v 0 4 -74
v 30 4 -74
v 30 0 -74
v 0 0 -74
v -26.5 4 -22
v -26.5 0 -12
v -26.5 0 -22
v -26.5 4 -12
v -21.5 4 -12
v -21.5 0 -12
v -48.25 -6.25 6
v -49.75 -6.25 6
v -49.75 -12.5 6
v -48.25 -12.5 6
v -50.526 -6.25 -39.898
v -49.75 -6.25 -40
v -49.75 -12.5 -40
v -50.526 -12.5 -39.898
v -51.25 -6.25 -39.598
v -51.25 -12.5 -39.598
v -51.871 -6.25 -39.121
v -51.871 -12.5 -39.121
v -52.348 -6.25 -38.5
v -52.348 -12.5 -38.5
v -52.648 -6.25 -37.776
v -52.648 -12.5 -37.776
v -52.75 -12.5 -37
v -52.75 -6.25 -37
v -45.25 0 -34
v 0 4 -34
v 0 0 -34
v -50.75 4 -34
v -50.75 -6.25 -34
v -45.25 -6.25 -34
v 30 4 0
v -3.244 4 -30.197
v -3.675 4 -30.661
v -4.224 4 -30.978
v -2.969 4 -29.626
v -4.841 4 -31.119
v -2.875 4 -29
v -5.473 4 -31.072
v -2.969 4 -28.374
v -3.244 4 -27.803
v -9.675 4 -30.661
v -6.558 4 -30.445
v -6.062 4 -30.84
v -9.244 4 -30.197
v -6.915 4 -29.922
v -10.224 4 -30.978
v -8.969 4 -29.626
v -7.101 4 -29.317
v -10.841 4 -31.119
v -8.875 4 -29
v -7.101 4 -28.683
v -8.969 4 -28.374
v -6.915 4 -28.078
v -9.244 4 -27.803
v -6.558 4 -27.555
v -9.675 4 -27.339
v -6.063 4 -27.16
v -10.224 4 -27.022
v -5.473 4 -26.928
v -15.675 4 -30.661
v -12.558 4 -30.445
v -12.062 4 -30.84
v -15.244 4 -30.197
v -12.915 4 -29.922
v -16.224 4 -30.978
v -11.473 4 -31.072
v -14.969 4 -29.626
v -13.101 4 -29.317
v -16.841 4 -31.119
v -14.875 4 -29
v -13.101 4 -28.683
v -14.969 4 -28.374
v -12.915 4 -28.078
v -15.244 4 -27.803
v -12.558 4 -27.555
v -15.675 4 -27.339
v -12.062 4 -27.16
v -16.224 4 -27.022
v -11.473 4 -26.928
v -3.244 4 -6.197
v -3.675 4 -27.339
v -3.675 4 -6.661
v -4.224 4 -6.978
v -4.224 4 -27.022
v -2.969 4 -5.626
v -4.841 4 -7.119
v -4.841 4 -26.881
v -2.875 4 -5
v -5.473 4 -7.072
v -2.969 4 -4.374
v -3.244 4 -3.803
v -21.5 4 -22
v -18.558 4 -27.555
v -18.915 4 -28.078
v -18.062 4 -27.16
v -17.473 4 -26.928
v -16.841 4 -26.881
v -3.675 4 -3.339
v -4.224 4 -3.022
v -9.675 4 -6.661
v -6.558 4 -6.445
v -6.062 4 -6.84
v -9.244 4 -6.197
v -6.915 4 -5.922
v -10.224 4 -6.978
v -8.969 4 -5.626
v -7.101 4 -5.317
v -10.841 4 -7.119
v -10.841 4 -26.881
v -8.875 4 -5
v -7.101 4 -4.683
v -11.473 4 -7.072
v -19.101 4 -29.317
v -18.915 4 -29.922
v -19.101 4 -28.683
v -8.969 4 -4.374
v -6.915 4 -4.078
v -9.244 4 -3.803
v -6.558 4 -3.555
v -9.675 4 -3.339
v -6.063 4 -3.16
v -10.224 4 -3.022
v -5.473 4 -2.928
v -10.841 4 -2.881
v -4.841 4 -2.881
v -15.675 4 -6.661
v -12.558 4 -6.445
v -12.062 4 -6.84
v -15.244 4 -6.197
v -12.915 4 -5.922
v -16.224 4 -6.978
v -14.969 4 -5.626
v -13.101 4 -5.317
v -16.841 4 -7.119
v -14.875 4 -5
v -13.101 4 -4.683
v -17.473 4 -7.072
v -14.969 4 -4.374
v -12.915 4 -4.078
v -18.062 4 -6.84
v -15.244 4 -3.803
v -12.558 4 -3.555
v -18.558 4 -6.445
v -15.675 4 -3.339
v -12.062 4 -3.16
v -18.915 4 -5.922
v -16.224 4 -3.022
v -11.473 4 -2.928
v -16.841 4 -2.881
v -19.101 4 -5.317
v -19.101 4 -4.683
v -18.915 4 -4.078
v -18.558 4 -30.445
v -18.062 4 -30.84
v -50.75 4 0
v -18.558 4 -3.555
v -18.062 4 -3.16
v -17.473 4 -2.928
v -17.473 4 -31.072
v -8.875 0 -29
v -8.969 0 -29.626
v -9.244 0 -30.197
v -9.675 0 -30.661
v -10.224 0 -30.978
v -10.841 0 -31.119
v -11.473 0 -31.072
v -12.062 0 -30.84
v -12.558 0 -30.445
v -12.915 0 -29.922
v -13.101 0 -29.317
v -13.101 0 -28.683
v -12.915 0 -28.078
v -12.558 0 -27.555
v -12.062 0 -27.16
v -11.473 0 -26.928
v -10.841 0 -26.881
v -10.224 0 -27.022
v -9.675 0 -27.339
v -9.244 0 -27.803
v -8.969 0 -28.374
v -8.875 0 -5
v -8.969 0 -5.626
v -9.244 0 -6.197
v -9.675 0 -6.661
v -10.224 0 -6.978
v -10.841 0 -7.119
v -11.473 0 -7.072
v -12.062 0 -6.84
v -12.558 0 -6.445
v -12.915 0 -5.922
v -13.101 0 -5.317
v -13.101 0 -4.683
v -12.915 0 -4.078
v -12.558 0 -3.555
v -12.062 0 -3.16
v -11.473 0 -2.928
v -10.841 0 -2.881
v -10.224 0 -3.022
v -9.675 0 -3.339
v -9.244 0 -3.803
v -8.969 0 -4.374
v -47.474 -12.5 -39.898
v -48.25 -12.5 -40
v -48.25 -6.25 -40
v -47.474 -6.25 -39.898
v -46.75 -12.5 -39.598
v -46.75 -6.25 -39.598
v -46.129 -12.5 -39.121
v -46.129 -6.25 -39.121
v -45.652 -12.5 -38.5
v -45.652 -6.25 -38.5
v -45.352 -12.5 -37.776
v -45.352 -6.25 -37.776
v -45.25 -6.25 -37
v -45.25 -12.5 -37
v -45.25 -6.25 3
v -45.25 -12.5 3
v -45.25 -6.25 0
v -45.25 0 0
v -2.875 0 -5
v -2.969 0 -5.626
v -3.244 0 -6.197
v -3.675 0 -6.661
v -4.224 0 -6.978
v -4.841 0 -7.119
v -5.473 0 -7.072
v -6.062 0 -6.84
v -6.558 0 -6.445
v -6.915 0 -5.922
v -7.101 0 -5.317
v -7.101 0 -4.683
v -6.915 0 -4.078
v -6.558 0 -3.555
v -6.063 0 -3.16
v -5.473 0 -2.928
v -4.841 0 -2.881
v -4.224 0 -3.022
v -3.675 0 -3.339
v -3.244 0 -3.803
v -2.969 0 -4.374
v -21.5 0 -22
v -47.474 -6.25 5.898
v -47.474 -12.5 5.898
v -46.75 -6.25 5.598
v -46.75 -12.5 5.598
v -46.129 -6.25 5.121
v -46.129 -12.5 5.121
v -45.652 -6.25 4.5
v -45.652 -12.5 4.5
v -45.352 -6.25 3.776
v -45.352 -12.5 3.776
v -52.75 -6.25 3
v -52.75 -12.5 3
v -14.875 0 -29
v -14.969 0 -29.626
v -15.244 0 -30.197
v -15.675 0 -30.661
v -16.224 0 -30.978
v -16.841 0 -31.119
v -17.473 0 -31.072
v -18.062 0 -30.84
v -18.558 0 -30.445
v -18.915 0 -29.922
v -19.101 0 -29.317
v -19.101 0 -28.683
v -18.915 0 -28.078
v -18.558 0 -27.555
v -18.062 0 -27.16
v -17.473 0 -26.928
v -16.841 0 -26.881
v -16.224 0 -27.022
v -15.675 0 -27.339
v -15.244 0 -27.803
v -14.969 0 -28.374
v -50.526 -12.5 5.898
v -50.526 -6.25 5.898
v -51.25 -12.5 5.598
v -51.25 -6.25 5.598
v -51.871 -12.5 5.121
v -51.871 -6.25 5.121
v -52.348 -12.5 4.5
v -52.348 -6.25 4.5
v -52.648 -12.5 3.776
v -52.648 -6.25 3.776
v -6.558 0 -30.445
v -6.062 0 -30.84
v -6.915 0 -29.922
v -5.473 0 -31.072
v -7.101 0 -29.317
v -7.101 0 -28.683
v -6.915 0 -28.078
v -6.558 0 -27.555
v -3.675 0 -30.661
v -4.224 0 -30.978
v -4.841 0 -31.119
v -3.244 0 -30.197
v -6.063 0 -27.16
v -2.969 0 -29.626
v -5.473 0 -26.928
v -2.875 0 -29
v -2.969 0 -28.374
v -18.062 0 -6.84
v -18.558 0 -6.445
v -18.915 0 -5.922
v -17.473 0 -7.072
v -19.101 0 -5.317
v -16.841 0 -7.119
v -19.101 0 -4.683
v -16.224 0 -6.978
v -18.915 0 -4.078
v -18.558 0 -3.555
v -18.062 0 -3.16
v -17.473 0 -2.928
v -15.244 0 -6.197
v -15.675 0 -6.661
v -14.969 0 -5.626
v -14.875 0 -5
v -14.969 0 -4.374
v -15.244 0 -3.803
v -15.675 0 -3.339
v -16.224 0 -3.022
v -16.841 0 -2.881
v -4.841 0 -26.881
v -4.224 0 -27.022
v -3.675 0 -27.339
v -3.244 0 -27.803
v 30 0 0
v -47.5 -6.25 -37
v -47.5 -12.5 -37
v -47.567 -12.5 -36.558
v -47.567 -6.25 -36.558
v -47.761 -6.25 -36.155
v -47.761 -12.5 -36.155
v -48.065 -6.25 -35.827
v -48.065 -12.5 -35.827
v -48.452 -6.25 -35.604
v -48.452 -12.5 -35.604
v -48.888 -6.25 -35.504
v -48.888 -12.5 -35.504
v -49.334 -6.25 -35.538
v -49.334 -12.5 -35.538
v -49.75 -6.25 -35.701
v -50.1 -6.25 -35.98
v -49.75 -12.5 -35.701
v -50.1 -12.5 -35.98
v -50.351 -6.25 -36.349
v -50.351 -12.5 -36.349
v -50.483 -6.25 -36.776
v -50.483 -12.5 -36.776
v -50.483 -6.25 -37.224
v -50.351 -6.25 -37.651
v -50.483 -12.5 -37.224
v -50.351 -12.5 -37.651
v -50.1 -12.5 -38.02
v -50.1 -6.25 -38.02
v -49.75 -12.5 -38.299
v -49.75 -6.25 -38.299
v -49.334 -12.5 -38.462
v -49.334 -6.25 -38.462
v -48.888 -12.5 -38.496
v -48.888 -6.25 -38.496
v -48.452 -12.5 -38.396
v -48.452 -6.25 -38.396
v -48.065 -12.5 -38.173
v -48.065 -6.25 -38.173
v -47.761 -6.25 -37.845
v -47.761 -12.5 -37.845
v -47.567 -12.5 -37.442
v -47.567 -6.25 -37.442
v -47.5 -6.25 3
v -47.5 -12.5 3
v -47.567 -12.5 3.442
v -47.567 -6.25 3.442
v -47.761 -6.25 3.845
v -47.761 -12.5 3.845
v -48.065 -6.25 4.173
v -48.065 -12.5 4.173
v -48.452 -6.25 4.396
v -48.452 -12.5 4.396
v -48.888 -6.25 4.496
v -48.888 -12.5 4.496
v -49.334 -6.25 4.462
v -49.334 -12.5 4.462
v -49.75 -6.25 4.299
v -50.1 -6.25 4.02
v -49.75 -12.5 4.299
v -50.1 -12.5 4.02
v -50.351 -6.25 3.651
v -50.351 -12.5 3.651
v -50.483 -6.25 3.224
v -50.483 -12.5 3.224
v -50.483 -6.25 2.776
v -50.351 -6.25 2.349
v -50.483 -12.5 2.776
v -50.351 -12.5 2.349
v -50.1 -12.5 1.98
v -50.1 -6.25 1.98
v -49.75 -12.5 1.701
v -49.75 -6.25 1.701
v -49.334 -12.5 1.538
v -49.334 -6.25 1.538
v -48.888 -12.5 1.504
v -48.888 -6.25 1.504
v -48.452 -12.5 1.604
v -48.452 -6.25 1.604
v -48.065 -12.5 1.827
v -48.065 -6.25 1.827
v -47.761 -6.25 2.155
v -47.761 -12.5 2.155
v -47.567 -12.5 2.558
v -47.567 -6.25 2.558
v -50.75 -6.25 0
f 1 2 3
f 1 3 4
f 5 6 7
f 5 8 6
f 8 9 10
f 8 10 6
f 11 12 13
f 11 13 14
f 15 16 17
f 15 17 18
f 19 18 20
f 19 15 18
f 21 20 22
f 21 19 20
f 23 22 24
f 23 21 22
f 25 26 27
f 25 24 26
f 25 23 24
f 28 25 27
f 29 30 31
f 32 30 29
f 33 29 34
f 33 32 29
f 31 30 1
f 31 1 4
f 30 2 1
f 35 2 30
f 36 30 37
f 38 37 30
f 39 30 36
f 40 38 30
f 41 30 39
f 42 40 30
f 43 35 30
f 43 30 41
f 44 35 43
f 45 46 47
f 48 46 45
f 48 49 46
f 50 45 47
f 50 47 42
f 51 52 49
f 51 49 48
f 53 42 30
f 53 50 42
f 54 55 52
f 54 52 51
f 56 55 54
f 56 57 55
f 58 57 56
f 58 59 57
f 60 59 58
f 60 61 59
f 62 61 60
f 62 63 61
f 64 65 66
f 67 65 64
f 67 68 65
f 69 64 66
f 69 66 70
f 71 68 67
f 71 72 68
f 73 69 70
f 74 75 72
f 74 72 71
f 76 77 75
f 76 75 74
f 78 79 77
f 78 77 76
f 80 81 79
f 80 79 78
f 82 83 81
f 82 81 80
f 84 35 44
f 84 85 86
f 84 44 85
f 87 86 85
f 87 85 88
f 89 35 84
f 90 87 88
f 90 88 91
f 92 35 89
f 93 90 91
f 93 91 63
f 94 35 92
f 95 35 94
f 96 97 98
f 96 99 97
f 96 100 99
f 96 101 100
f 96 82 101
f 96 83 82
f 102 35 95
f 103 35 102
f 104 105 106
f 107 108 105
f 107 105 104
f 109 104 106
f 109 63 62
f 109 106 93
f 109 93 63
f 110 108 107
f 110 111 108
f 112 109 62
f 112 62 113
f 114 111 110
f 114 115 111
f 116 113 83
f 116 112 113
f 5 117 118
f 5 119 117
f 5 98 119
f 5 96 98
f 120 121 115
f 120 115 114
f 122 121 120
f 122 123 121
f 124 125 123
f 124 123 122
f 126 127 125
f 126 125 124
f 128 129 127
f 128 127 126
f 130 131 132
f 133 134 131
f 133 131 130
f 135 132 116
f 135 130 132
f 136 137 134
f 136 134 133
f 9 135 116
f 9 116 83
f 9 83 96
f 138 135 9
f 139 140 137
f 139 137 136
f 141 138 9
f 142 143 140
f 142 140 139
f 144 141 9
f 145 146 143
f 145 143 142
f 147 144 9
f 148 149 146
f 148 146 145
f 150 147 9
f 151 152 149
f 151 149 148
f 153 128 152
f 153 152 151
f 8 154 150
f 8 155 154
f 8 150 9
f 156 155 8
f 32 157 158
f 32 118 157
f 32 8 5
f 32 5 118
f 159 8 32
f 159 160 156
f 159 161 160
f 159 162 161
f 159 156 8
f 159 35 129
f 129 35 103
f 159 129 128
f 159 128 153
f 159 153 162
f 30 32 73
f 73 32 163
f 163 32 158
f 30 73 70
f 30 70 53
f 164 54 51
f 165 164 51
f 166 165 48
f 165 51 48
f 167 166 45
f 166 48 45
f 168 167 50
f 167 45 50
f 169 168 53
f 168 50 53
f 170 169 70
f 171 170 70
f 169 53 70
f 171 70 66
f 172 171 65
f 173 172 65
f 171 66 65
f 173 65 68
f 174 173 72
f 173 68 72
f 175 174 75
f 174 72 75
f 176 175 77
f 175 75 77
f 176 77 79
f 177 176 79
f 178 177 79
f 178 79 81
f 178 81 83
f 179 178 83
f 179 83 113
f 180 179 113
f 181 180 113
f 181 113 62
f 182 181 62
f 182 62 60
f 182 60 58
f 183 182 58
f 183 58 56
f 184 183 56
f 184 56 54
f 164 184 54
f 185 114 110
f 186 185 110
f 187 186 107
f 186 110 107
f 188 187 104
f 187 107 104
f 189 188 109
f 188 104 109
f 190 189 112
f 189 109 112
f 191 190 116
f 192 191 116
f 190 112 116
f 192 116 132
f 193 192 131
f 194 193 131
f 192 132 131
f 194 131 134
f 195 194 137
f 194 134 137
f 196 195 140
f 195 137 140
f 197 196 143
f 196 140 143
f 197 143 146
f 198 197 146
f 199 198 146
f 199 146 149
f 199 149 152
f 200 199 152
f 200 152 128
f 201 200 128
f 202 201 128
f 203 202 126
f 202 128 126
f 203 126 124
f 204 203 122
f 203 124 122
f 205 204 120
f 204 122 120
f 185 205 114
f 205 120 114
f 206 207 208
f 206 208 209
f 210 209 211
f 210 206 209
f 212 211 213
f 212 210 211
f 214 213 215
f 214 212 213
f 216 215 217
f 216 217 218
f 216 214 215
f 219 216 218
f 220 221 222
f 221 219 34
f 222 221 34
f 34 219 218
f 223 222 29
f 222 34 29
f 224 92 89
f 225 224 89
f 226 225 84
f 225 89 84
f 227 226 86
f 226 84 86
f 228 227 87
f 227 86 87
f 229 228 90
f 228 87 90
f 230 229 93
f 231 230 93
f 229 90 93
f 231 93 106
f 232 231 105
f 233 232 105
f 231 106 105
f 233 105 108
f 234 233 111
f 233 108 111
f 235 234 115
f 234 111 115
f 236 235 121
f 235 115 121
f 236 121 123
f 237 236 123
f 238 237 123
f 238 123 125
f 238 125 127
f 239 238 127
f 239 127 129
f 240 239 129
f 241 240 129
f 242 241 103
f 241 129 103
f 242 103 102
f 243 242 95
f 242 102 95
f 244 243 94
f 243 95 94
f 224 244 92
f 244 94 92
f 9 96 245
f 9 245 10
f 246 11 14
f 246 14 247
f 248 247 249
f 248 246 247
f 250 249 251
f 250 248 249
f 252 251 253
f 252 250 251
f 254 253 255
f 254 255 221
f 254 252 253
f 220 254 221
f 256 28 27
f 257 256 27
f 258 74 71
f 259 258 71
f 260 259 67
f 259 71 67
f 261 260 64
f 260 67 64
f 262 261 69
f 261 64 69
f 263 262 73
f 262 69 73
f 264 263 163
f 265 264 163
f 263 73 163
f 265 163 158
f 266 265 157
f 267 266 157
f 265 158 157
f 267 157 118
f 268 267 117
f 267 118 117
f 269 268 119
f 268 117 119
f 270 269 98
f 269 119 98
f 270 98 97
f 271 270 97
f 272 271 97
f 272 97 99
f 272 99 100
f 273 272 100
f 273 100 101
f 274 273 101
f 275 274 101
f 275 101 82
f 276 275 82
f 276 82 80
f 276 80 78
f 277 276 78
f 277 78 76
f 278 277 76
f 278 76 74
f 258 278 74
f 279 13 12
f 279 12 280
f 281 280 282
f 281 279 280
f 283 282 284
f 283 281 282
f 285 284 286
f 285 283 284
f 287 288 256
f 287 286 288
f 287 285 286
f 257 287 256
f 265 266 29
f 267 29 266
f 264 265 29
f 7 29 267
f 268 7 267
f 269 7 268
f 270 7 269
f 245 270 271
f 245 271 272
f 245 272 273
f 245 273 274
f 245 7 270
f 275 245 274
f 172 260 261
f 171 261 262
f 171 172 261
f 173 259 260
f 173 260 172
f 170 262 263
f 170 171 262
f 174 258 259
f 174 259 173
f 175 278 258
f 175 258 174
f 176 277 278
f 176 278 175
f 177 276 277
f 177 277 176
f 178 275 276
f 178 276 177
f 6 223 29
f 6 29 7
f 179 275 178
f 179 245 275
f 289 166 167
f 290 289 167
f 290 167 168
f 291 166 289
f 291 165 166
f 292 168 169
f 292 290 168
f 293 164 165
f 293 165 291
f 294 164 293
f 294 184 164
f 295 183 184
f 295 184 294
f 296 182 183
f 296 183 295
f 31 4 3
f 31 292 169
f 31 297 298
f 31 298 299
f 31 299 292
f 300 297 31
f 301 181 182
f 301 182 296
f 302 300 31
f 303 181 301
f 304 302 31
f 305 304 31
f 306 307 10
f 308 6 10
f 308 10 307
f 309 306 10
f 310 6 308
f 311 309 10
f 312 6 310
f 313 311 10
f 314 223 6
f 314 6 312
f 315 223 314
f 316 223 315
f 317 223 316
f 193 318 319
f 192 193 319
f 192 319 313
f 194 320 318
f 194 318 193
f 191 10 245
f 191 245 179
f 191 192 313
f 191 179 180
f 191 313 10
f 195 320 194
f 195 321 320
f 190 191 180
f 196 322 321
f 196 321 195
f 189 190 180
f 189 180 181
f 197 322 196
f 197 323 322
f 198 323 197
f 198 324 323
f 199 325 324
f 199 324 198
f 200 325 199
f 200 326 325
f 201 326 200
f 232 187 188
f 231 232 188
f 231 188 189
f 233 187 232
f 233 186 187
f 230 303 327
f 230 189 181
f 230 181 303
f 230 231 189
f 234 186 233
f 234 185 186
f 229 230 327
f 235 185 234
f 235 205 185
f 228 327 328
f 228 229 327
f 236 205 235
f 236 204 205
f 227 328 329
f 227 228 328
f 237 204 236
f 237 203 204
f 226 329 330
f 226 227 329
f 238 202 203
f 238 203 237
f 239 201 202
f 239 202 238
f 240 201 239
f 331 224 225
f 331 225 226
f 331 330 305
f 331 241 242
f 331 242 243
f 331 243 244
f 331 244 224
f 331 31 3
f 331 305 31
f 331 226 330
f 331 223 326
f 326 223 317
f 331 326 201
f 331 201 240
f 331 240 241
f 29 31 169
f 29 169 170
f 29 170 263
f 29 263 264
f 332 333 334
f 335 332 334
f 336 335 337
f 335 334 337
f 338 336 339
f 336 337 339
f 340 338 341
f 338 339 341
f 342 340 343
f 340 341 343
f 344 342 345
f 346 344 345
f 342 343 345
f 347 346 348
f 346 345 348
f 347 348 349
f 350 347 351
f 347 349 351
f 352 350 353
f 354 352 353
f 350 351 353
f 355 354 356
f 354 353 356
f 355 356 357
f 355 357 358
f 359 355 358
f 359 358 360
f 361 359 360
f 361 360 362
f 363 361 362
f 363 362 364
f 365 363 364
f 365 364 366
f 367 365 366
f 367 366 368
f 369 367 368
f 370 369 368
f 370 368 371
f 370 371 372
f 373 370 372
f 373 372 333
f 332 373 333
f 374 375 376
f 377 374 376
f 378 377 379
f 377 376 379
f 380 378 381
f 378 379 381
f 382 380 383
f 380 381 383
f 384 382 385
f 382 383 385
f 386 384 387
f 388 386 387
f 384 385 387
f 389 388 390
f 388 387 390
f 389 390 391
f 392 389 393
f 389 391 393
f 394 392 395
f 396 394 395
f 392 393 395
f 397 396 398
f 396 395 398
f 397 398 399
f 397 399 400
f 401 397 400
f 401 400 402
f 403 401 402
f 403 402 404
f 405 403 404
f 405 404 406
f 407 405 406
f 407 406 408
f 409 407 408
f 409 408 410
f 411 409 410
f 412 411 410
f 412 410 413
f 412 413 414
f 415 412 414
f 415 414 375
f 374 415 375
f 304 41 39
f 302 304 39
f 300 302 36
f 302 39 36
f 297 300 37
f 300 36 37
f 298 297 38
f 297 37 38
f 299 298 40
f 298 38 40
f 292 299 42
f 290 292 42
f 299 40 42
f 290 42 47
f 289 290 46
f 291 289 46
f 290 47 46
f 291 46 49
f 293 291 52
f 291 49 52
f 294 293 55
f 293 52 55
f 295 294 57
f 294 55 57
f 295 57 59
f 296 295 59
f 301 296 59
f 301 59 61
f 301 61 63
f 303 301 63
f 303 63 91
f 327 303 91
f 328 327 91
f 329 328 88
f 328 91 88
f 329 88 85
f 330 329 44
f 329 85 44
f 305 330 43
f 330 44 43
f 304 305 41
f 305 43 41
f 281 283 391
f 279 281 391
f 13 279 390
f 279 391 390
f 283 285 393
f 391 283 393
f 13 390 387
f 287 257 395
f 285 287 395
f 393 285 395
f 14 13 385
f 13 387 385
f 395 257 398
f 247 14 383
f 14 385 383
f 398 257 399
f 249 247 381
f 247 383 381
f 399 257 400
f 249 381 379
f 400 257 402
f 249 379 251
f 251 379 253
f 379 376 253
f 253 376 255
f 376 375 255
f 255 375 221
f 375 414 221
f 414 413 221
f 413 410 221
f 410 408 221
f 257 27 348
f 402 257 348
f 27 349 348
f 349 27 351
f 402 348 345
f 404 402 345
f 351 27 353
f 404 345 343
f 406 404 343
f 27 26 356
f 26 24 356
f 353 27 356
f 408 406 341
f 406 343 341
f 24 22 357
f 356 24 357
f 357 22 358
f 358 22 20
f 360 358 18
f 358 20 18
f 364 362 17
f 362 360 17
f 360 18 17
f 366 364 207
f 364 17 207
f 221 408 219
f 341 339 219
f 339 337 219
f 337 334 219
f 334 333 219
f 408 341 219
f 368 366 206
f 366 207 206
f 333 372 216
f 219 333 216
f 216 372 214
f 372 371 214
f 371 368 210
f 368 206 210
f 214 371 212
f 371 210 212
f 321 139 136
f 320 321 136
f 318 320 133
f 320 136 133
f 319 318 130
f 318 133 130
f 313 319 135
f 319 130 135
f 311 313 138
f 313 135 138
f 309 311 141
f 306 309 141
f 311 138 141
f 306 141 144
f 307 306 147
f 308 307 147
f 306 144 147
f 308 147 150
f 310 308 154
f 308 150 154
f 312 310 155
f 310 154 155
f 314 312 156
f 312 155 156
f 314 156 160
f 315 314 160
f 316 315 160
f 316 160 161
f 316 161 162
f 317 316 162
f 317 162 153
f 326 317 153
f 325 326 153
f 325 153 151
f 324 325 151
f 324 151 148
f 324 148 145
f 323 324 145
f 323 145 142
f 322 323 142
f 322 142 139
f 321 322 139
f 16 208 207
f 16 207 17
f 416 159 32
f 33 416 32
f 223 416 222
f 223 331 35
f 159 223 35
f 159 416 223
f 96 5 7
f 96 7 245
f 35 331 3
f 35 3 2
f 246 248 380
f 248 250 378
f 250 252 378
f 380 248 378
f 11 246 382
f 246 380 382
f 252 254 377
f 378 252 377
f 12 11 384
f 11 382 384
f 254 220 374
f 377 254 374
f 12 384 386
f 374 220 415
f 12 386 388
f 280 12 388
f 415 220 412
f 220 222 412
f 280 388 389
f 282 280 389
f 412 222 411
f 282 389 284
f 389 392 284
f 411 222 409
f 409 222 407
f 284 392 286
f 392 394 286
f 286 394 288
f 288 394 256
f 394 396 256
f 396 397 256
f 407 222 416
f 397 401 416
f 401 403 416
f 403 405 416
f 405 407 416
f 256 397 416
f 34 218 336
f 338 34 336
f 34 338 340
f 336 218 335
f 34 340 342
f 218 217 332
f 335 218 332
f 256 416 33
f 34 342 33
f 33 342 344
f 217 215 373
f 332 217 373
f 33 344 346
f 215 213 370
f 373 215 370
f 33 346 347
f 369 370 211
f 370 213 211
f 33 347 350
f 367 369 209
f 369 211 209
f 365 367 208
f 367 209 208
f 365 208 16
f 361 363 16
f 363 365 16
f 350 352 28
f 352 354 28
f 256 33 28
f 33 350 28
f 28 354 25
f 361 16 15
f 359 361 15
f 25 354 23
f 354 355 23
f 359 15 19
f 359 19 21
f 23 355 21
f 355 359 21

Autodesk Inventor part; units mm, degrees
ref_plane "YZ Plane" through (0, 0, 0) normal (1, 0, 0) x (0, 1, 0)
ref_plane "XZ Plane" through (0, 0, 0) normal (0, 1, 0) x (-1, 0, 0)
ref_plane "XY Plane" through (0, 0, 0) normal (0, 0, 1) x (1, 0, 0)
sketch "Sketch1" plane through (0, 0, 0) normal (0, 1, 0) x (-1, 0, 0)
  line L0 (0, 0) -> (22, 0)
  line L1 (22, 0) -> (22, -34)
  line L2 (22, -34) -> (0, -34)
  line L3 (0, -34) -> (0, 0)
  dimension "d0" = 22
  dimension "d1" = 34
extrude "Extrusion1" add sketch "Sketch1" along normal blind 4
sketch "Sketch2" plane through (0, 4, 0) normal (0, 1, 0) x (1, 0, 0)
  line L0 (-22, 0) -> (0, 0) projected
  circle A0 centre (-5, 5) radius 2.125
  dimension "d7" = 4.25
extrude "Extrusion2" cut sketch "Sketch2" against normal through all
pattern_linear "Rectangular Pattern1" count 3 spacing 6 along (-1, 0, 0) count 2 spacing 24 along (0, 0, -1) of "Extrusion2"
sketch "Sketch3" plane through (-22, 0, -34) normal (-1, 0, 0) x (0, 0, 1)
  line L0 (34, 0) -> (0, 0)
  line L1 (0, 0) -> (0, 4)
  line L2 (0, 4) -> (34, 4)
  line L3 (34, 4) -> (34, 0)
extrude "Extrusion3" add sketch "Sketch3" along normal blind 23.25
sketch "Sketch4" plane through (0, 4, 0) normal (0, 1, 0) x (1, 0, 0)
  line L0 (-45.25, 0) -> (-50.75, 0)
  line L1 (-50.75, 0) -> (-50.75, 34)
  line L2 (-50.75, 34) -> (-45.25, 34)
  line L3 (-45.25, 34) -> (-45.25, 0)
  point P0 (0, 0)
  dimension "d18" = 5.5
extrude "Extrusion4" add sketch "Sketch4" against normal blind 16.5
sketch "Sketch5" plane through (-50.75, 4, -34) normal (-1, 0, 0) x (0, 0, 1)
  line L0 (0, -4) -> (0, -16.5) projected
  line L1 (34, -16.5) -> (0, -16.5)
  line L2 (0, -16.5) -> (0, -10.25)
  line L3 (0, -10.25) -> (34, -10.25)
  line L4 (34, -10.25) -> (34, -16.5)
  point P0 (34, -4)
  dimension "d21" = 6.25
extrude "Extrusion5" add sketch "Sketch5" along normal blind 2
sketch "Sketch6" plane through (0, 0, -34) normal (0, 0, -1) x (-1, 0, 0)
  line L0 (52.75, -6.25) -> (45.25, -6.25)
  line L1 (45.25, -6.25) -> (45.25, -12.5)
  line L2 (45.25, -12.5) -> (52.75, -12.5)
  line L3 (52.75, -12.5) -> (52.75, -6.25)
  point P0 (0, 0)
extrude "Extrusion6" add sketch "Sketch6" along normal blind 6
sketch "Sketch7" plane through (0, 0, 0) normal (0, 0, 1) x (1, 0, 0)
  line L0 (-52.75, -12.5) -> (-45.25, -12.5)
  line L1 (-45.25, -12.5) -> (-45.25, -6.25)
  line L2 (-45.25, -6.25) -> (-52.75, -6.25)
  line L3 (-52.75, -6.25) -> (-52.75, -12.5)
  point P0 (0, 0)
extrude "Extrusion7" add sketch "Sketch7" along normal blind 6
fillet "Fillet1" radius 3 1 edges at (-52.75, -9.375, 6)
fillet "Fillet2" radius 3 1 edges at (-45.25, -9.375, 6)
fillet "Fillet3" radius 3 1 edges at (-52.75, -9.375, -40)
fillet "Fillet4" radius 3 1 edges at (-45.25, -9.375, -40)
sketch "Sketch8" plane through (0, -12.5, 0) normal (0, -1, 0) x (1, 0, 0)
  line L0 (-45.25, -34) -> (-52.75, -34)
  line L1 (-52.75, 3) -> (-52.75, -37) projected
  line L2 (-45.25, -34) -> (0, -34) projected
  line L3 (-49.75, -40) -> (-48.25, -40) projected
  line L4 (-49, -40) -> (-49, -34)
  line L5 (-45.25, -34) -> (-50.75, -34) projected
  line L6 (-52.75, 0) -> (-45.25, 0)
  line L7 (-50.75, 0) -> (-45.25, 0) projected
  line L8 (-49.75, 6) -> (-48.25, 6) projected
  line L9 (-49, 6) -> (-49, 0)
  circle A0 centre (-49, -37) radius 1.5
  circle A1 centre (-49, 3) radius 1.5
  point P0 (0, 0)
  dimension "d32" = 3
  dimension "d33" = 3
extrude "Extrusion8" cut sketch "Sketch8" against normal through all
sketch "Sketch9" plane through (0, 4, 0) normal (0, 1, 0) x (1, 0, 0)
  line L0 (0, 0) -> (0, 34) projected
  line L1 (0, 17) -> (-24, 17)
  line L2 (-21.5, 12) -> (-26.5, 12)
  line L3 (-26.5, 12) -> (-26.5, 22)
  line L4 (-26.5, 22) -> (-21.5, 22)
  line L5 (-21.5, 22) -> (-21.5, 12)
  line L6 (-21.5, 12) -> (-26.5, 22) construction
  line L7 (-26.5, 12) -> (-21.5, 22) construction
  dimension "d36" = 24
  dimension "d37" = 5
  dimension "d38" = 10
extrude "Extrusion9" cut sketch "Sketch9" against normal through all
sketch "Sketch10" plane through (0, 0, 0) normal (1, 0, 0) x (0, 0, -1)
  line L0 (0, 4) -> (34, 4)
  line L1 (34, 4) -> (34, 0)
  line L2 (34, 0) -> (0, 0)
  line L3 (0, 0) -> (0, 4)
extrude "Extrusion10" add sketch "Sketch10" along normal blind 30
sketch "Sketch11" plane through (-45.25, -6.25, -34) normal (0, 0, -1) x (-1, 0, 0)
  line L0 (-75.25, 10.25) -> (-45.25, 10.25)
  line L1 (-45.25, 10.25) -> (-45.25, 6.25)
  line L2 (-45.25, 6.25) -> (-75.25, 6.25)
  line L3 (-75.25, 6.25) -> (-75.25, 10.25)
extrude "Extrusion11" add sketch "Sketch11" along normal blind 40
properties part number "CartServoMountV2"
